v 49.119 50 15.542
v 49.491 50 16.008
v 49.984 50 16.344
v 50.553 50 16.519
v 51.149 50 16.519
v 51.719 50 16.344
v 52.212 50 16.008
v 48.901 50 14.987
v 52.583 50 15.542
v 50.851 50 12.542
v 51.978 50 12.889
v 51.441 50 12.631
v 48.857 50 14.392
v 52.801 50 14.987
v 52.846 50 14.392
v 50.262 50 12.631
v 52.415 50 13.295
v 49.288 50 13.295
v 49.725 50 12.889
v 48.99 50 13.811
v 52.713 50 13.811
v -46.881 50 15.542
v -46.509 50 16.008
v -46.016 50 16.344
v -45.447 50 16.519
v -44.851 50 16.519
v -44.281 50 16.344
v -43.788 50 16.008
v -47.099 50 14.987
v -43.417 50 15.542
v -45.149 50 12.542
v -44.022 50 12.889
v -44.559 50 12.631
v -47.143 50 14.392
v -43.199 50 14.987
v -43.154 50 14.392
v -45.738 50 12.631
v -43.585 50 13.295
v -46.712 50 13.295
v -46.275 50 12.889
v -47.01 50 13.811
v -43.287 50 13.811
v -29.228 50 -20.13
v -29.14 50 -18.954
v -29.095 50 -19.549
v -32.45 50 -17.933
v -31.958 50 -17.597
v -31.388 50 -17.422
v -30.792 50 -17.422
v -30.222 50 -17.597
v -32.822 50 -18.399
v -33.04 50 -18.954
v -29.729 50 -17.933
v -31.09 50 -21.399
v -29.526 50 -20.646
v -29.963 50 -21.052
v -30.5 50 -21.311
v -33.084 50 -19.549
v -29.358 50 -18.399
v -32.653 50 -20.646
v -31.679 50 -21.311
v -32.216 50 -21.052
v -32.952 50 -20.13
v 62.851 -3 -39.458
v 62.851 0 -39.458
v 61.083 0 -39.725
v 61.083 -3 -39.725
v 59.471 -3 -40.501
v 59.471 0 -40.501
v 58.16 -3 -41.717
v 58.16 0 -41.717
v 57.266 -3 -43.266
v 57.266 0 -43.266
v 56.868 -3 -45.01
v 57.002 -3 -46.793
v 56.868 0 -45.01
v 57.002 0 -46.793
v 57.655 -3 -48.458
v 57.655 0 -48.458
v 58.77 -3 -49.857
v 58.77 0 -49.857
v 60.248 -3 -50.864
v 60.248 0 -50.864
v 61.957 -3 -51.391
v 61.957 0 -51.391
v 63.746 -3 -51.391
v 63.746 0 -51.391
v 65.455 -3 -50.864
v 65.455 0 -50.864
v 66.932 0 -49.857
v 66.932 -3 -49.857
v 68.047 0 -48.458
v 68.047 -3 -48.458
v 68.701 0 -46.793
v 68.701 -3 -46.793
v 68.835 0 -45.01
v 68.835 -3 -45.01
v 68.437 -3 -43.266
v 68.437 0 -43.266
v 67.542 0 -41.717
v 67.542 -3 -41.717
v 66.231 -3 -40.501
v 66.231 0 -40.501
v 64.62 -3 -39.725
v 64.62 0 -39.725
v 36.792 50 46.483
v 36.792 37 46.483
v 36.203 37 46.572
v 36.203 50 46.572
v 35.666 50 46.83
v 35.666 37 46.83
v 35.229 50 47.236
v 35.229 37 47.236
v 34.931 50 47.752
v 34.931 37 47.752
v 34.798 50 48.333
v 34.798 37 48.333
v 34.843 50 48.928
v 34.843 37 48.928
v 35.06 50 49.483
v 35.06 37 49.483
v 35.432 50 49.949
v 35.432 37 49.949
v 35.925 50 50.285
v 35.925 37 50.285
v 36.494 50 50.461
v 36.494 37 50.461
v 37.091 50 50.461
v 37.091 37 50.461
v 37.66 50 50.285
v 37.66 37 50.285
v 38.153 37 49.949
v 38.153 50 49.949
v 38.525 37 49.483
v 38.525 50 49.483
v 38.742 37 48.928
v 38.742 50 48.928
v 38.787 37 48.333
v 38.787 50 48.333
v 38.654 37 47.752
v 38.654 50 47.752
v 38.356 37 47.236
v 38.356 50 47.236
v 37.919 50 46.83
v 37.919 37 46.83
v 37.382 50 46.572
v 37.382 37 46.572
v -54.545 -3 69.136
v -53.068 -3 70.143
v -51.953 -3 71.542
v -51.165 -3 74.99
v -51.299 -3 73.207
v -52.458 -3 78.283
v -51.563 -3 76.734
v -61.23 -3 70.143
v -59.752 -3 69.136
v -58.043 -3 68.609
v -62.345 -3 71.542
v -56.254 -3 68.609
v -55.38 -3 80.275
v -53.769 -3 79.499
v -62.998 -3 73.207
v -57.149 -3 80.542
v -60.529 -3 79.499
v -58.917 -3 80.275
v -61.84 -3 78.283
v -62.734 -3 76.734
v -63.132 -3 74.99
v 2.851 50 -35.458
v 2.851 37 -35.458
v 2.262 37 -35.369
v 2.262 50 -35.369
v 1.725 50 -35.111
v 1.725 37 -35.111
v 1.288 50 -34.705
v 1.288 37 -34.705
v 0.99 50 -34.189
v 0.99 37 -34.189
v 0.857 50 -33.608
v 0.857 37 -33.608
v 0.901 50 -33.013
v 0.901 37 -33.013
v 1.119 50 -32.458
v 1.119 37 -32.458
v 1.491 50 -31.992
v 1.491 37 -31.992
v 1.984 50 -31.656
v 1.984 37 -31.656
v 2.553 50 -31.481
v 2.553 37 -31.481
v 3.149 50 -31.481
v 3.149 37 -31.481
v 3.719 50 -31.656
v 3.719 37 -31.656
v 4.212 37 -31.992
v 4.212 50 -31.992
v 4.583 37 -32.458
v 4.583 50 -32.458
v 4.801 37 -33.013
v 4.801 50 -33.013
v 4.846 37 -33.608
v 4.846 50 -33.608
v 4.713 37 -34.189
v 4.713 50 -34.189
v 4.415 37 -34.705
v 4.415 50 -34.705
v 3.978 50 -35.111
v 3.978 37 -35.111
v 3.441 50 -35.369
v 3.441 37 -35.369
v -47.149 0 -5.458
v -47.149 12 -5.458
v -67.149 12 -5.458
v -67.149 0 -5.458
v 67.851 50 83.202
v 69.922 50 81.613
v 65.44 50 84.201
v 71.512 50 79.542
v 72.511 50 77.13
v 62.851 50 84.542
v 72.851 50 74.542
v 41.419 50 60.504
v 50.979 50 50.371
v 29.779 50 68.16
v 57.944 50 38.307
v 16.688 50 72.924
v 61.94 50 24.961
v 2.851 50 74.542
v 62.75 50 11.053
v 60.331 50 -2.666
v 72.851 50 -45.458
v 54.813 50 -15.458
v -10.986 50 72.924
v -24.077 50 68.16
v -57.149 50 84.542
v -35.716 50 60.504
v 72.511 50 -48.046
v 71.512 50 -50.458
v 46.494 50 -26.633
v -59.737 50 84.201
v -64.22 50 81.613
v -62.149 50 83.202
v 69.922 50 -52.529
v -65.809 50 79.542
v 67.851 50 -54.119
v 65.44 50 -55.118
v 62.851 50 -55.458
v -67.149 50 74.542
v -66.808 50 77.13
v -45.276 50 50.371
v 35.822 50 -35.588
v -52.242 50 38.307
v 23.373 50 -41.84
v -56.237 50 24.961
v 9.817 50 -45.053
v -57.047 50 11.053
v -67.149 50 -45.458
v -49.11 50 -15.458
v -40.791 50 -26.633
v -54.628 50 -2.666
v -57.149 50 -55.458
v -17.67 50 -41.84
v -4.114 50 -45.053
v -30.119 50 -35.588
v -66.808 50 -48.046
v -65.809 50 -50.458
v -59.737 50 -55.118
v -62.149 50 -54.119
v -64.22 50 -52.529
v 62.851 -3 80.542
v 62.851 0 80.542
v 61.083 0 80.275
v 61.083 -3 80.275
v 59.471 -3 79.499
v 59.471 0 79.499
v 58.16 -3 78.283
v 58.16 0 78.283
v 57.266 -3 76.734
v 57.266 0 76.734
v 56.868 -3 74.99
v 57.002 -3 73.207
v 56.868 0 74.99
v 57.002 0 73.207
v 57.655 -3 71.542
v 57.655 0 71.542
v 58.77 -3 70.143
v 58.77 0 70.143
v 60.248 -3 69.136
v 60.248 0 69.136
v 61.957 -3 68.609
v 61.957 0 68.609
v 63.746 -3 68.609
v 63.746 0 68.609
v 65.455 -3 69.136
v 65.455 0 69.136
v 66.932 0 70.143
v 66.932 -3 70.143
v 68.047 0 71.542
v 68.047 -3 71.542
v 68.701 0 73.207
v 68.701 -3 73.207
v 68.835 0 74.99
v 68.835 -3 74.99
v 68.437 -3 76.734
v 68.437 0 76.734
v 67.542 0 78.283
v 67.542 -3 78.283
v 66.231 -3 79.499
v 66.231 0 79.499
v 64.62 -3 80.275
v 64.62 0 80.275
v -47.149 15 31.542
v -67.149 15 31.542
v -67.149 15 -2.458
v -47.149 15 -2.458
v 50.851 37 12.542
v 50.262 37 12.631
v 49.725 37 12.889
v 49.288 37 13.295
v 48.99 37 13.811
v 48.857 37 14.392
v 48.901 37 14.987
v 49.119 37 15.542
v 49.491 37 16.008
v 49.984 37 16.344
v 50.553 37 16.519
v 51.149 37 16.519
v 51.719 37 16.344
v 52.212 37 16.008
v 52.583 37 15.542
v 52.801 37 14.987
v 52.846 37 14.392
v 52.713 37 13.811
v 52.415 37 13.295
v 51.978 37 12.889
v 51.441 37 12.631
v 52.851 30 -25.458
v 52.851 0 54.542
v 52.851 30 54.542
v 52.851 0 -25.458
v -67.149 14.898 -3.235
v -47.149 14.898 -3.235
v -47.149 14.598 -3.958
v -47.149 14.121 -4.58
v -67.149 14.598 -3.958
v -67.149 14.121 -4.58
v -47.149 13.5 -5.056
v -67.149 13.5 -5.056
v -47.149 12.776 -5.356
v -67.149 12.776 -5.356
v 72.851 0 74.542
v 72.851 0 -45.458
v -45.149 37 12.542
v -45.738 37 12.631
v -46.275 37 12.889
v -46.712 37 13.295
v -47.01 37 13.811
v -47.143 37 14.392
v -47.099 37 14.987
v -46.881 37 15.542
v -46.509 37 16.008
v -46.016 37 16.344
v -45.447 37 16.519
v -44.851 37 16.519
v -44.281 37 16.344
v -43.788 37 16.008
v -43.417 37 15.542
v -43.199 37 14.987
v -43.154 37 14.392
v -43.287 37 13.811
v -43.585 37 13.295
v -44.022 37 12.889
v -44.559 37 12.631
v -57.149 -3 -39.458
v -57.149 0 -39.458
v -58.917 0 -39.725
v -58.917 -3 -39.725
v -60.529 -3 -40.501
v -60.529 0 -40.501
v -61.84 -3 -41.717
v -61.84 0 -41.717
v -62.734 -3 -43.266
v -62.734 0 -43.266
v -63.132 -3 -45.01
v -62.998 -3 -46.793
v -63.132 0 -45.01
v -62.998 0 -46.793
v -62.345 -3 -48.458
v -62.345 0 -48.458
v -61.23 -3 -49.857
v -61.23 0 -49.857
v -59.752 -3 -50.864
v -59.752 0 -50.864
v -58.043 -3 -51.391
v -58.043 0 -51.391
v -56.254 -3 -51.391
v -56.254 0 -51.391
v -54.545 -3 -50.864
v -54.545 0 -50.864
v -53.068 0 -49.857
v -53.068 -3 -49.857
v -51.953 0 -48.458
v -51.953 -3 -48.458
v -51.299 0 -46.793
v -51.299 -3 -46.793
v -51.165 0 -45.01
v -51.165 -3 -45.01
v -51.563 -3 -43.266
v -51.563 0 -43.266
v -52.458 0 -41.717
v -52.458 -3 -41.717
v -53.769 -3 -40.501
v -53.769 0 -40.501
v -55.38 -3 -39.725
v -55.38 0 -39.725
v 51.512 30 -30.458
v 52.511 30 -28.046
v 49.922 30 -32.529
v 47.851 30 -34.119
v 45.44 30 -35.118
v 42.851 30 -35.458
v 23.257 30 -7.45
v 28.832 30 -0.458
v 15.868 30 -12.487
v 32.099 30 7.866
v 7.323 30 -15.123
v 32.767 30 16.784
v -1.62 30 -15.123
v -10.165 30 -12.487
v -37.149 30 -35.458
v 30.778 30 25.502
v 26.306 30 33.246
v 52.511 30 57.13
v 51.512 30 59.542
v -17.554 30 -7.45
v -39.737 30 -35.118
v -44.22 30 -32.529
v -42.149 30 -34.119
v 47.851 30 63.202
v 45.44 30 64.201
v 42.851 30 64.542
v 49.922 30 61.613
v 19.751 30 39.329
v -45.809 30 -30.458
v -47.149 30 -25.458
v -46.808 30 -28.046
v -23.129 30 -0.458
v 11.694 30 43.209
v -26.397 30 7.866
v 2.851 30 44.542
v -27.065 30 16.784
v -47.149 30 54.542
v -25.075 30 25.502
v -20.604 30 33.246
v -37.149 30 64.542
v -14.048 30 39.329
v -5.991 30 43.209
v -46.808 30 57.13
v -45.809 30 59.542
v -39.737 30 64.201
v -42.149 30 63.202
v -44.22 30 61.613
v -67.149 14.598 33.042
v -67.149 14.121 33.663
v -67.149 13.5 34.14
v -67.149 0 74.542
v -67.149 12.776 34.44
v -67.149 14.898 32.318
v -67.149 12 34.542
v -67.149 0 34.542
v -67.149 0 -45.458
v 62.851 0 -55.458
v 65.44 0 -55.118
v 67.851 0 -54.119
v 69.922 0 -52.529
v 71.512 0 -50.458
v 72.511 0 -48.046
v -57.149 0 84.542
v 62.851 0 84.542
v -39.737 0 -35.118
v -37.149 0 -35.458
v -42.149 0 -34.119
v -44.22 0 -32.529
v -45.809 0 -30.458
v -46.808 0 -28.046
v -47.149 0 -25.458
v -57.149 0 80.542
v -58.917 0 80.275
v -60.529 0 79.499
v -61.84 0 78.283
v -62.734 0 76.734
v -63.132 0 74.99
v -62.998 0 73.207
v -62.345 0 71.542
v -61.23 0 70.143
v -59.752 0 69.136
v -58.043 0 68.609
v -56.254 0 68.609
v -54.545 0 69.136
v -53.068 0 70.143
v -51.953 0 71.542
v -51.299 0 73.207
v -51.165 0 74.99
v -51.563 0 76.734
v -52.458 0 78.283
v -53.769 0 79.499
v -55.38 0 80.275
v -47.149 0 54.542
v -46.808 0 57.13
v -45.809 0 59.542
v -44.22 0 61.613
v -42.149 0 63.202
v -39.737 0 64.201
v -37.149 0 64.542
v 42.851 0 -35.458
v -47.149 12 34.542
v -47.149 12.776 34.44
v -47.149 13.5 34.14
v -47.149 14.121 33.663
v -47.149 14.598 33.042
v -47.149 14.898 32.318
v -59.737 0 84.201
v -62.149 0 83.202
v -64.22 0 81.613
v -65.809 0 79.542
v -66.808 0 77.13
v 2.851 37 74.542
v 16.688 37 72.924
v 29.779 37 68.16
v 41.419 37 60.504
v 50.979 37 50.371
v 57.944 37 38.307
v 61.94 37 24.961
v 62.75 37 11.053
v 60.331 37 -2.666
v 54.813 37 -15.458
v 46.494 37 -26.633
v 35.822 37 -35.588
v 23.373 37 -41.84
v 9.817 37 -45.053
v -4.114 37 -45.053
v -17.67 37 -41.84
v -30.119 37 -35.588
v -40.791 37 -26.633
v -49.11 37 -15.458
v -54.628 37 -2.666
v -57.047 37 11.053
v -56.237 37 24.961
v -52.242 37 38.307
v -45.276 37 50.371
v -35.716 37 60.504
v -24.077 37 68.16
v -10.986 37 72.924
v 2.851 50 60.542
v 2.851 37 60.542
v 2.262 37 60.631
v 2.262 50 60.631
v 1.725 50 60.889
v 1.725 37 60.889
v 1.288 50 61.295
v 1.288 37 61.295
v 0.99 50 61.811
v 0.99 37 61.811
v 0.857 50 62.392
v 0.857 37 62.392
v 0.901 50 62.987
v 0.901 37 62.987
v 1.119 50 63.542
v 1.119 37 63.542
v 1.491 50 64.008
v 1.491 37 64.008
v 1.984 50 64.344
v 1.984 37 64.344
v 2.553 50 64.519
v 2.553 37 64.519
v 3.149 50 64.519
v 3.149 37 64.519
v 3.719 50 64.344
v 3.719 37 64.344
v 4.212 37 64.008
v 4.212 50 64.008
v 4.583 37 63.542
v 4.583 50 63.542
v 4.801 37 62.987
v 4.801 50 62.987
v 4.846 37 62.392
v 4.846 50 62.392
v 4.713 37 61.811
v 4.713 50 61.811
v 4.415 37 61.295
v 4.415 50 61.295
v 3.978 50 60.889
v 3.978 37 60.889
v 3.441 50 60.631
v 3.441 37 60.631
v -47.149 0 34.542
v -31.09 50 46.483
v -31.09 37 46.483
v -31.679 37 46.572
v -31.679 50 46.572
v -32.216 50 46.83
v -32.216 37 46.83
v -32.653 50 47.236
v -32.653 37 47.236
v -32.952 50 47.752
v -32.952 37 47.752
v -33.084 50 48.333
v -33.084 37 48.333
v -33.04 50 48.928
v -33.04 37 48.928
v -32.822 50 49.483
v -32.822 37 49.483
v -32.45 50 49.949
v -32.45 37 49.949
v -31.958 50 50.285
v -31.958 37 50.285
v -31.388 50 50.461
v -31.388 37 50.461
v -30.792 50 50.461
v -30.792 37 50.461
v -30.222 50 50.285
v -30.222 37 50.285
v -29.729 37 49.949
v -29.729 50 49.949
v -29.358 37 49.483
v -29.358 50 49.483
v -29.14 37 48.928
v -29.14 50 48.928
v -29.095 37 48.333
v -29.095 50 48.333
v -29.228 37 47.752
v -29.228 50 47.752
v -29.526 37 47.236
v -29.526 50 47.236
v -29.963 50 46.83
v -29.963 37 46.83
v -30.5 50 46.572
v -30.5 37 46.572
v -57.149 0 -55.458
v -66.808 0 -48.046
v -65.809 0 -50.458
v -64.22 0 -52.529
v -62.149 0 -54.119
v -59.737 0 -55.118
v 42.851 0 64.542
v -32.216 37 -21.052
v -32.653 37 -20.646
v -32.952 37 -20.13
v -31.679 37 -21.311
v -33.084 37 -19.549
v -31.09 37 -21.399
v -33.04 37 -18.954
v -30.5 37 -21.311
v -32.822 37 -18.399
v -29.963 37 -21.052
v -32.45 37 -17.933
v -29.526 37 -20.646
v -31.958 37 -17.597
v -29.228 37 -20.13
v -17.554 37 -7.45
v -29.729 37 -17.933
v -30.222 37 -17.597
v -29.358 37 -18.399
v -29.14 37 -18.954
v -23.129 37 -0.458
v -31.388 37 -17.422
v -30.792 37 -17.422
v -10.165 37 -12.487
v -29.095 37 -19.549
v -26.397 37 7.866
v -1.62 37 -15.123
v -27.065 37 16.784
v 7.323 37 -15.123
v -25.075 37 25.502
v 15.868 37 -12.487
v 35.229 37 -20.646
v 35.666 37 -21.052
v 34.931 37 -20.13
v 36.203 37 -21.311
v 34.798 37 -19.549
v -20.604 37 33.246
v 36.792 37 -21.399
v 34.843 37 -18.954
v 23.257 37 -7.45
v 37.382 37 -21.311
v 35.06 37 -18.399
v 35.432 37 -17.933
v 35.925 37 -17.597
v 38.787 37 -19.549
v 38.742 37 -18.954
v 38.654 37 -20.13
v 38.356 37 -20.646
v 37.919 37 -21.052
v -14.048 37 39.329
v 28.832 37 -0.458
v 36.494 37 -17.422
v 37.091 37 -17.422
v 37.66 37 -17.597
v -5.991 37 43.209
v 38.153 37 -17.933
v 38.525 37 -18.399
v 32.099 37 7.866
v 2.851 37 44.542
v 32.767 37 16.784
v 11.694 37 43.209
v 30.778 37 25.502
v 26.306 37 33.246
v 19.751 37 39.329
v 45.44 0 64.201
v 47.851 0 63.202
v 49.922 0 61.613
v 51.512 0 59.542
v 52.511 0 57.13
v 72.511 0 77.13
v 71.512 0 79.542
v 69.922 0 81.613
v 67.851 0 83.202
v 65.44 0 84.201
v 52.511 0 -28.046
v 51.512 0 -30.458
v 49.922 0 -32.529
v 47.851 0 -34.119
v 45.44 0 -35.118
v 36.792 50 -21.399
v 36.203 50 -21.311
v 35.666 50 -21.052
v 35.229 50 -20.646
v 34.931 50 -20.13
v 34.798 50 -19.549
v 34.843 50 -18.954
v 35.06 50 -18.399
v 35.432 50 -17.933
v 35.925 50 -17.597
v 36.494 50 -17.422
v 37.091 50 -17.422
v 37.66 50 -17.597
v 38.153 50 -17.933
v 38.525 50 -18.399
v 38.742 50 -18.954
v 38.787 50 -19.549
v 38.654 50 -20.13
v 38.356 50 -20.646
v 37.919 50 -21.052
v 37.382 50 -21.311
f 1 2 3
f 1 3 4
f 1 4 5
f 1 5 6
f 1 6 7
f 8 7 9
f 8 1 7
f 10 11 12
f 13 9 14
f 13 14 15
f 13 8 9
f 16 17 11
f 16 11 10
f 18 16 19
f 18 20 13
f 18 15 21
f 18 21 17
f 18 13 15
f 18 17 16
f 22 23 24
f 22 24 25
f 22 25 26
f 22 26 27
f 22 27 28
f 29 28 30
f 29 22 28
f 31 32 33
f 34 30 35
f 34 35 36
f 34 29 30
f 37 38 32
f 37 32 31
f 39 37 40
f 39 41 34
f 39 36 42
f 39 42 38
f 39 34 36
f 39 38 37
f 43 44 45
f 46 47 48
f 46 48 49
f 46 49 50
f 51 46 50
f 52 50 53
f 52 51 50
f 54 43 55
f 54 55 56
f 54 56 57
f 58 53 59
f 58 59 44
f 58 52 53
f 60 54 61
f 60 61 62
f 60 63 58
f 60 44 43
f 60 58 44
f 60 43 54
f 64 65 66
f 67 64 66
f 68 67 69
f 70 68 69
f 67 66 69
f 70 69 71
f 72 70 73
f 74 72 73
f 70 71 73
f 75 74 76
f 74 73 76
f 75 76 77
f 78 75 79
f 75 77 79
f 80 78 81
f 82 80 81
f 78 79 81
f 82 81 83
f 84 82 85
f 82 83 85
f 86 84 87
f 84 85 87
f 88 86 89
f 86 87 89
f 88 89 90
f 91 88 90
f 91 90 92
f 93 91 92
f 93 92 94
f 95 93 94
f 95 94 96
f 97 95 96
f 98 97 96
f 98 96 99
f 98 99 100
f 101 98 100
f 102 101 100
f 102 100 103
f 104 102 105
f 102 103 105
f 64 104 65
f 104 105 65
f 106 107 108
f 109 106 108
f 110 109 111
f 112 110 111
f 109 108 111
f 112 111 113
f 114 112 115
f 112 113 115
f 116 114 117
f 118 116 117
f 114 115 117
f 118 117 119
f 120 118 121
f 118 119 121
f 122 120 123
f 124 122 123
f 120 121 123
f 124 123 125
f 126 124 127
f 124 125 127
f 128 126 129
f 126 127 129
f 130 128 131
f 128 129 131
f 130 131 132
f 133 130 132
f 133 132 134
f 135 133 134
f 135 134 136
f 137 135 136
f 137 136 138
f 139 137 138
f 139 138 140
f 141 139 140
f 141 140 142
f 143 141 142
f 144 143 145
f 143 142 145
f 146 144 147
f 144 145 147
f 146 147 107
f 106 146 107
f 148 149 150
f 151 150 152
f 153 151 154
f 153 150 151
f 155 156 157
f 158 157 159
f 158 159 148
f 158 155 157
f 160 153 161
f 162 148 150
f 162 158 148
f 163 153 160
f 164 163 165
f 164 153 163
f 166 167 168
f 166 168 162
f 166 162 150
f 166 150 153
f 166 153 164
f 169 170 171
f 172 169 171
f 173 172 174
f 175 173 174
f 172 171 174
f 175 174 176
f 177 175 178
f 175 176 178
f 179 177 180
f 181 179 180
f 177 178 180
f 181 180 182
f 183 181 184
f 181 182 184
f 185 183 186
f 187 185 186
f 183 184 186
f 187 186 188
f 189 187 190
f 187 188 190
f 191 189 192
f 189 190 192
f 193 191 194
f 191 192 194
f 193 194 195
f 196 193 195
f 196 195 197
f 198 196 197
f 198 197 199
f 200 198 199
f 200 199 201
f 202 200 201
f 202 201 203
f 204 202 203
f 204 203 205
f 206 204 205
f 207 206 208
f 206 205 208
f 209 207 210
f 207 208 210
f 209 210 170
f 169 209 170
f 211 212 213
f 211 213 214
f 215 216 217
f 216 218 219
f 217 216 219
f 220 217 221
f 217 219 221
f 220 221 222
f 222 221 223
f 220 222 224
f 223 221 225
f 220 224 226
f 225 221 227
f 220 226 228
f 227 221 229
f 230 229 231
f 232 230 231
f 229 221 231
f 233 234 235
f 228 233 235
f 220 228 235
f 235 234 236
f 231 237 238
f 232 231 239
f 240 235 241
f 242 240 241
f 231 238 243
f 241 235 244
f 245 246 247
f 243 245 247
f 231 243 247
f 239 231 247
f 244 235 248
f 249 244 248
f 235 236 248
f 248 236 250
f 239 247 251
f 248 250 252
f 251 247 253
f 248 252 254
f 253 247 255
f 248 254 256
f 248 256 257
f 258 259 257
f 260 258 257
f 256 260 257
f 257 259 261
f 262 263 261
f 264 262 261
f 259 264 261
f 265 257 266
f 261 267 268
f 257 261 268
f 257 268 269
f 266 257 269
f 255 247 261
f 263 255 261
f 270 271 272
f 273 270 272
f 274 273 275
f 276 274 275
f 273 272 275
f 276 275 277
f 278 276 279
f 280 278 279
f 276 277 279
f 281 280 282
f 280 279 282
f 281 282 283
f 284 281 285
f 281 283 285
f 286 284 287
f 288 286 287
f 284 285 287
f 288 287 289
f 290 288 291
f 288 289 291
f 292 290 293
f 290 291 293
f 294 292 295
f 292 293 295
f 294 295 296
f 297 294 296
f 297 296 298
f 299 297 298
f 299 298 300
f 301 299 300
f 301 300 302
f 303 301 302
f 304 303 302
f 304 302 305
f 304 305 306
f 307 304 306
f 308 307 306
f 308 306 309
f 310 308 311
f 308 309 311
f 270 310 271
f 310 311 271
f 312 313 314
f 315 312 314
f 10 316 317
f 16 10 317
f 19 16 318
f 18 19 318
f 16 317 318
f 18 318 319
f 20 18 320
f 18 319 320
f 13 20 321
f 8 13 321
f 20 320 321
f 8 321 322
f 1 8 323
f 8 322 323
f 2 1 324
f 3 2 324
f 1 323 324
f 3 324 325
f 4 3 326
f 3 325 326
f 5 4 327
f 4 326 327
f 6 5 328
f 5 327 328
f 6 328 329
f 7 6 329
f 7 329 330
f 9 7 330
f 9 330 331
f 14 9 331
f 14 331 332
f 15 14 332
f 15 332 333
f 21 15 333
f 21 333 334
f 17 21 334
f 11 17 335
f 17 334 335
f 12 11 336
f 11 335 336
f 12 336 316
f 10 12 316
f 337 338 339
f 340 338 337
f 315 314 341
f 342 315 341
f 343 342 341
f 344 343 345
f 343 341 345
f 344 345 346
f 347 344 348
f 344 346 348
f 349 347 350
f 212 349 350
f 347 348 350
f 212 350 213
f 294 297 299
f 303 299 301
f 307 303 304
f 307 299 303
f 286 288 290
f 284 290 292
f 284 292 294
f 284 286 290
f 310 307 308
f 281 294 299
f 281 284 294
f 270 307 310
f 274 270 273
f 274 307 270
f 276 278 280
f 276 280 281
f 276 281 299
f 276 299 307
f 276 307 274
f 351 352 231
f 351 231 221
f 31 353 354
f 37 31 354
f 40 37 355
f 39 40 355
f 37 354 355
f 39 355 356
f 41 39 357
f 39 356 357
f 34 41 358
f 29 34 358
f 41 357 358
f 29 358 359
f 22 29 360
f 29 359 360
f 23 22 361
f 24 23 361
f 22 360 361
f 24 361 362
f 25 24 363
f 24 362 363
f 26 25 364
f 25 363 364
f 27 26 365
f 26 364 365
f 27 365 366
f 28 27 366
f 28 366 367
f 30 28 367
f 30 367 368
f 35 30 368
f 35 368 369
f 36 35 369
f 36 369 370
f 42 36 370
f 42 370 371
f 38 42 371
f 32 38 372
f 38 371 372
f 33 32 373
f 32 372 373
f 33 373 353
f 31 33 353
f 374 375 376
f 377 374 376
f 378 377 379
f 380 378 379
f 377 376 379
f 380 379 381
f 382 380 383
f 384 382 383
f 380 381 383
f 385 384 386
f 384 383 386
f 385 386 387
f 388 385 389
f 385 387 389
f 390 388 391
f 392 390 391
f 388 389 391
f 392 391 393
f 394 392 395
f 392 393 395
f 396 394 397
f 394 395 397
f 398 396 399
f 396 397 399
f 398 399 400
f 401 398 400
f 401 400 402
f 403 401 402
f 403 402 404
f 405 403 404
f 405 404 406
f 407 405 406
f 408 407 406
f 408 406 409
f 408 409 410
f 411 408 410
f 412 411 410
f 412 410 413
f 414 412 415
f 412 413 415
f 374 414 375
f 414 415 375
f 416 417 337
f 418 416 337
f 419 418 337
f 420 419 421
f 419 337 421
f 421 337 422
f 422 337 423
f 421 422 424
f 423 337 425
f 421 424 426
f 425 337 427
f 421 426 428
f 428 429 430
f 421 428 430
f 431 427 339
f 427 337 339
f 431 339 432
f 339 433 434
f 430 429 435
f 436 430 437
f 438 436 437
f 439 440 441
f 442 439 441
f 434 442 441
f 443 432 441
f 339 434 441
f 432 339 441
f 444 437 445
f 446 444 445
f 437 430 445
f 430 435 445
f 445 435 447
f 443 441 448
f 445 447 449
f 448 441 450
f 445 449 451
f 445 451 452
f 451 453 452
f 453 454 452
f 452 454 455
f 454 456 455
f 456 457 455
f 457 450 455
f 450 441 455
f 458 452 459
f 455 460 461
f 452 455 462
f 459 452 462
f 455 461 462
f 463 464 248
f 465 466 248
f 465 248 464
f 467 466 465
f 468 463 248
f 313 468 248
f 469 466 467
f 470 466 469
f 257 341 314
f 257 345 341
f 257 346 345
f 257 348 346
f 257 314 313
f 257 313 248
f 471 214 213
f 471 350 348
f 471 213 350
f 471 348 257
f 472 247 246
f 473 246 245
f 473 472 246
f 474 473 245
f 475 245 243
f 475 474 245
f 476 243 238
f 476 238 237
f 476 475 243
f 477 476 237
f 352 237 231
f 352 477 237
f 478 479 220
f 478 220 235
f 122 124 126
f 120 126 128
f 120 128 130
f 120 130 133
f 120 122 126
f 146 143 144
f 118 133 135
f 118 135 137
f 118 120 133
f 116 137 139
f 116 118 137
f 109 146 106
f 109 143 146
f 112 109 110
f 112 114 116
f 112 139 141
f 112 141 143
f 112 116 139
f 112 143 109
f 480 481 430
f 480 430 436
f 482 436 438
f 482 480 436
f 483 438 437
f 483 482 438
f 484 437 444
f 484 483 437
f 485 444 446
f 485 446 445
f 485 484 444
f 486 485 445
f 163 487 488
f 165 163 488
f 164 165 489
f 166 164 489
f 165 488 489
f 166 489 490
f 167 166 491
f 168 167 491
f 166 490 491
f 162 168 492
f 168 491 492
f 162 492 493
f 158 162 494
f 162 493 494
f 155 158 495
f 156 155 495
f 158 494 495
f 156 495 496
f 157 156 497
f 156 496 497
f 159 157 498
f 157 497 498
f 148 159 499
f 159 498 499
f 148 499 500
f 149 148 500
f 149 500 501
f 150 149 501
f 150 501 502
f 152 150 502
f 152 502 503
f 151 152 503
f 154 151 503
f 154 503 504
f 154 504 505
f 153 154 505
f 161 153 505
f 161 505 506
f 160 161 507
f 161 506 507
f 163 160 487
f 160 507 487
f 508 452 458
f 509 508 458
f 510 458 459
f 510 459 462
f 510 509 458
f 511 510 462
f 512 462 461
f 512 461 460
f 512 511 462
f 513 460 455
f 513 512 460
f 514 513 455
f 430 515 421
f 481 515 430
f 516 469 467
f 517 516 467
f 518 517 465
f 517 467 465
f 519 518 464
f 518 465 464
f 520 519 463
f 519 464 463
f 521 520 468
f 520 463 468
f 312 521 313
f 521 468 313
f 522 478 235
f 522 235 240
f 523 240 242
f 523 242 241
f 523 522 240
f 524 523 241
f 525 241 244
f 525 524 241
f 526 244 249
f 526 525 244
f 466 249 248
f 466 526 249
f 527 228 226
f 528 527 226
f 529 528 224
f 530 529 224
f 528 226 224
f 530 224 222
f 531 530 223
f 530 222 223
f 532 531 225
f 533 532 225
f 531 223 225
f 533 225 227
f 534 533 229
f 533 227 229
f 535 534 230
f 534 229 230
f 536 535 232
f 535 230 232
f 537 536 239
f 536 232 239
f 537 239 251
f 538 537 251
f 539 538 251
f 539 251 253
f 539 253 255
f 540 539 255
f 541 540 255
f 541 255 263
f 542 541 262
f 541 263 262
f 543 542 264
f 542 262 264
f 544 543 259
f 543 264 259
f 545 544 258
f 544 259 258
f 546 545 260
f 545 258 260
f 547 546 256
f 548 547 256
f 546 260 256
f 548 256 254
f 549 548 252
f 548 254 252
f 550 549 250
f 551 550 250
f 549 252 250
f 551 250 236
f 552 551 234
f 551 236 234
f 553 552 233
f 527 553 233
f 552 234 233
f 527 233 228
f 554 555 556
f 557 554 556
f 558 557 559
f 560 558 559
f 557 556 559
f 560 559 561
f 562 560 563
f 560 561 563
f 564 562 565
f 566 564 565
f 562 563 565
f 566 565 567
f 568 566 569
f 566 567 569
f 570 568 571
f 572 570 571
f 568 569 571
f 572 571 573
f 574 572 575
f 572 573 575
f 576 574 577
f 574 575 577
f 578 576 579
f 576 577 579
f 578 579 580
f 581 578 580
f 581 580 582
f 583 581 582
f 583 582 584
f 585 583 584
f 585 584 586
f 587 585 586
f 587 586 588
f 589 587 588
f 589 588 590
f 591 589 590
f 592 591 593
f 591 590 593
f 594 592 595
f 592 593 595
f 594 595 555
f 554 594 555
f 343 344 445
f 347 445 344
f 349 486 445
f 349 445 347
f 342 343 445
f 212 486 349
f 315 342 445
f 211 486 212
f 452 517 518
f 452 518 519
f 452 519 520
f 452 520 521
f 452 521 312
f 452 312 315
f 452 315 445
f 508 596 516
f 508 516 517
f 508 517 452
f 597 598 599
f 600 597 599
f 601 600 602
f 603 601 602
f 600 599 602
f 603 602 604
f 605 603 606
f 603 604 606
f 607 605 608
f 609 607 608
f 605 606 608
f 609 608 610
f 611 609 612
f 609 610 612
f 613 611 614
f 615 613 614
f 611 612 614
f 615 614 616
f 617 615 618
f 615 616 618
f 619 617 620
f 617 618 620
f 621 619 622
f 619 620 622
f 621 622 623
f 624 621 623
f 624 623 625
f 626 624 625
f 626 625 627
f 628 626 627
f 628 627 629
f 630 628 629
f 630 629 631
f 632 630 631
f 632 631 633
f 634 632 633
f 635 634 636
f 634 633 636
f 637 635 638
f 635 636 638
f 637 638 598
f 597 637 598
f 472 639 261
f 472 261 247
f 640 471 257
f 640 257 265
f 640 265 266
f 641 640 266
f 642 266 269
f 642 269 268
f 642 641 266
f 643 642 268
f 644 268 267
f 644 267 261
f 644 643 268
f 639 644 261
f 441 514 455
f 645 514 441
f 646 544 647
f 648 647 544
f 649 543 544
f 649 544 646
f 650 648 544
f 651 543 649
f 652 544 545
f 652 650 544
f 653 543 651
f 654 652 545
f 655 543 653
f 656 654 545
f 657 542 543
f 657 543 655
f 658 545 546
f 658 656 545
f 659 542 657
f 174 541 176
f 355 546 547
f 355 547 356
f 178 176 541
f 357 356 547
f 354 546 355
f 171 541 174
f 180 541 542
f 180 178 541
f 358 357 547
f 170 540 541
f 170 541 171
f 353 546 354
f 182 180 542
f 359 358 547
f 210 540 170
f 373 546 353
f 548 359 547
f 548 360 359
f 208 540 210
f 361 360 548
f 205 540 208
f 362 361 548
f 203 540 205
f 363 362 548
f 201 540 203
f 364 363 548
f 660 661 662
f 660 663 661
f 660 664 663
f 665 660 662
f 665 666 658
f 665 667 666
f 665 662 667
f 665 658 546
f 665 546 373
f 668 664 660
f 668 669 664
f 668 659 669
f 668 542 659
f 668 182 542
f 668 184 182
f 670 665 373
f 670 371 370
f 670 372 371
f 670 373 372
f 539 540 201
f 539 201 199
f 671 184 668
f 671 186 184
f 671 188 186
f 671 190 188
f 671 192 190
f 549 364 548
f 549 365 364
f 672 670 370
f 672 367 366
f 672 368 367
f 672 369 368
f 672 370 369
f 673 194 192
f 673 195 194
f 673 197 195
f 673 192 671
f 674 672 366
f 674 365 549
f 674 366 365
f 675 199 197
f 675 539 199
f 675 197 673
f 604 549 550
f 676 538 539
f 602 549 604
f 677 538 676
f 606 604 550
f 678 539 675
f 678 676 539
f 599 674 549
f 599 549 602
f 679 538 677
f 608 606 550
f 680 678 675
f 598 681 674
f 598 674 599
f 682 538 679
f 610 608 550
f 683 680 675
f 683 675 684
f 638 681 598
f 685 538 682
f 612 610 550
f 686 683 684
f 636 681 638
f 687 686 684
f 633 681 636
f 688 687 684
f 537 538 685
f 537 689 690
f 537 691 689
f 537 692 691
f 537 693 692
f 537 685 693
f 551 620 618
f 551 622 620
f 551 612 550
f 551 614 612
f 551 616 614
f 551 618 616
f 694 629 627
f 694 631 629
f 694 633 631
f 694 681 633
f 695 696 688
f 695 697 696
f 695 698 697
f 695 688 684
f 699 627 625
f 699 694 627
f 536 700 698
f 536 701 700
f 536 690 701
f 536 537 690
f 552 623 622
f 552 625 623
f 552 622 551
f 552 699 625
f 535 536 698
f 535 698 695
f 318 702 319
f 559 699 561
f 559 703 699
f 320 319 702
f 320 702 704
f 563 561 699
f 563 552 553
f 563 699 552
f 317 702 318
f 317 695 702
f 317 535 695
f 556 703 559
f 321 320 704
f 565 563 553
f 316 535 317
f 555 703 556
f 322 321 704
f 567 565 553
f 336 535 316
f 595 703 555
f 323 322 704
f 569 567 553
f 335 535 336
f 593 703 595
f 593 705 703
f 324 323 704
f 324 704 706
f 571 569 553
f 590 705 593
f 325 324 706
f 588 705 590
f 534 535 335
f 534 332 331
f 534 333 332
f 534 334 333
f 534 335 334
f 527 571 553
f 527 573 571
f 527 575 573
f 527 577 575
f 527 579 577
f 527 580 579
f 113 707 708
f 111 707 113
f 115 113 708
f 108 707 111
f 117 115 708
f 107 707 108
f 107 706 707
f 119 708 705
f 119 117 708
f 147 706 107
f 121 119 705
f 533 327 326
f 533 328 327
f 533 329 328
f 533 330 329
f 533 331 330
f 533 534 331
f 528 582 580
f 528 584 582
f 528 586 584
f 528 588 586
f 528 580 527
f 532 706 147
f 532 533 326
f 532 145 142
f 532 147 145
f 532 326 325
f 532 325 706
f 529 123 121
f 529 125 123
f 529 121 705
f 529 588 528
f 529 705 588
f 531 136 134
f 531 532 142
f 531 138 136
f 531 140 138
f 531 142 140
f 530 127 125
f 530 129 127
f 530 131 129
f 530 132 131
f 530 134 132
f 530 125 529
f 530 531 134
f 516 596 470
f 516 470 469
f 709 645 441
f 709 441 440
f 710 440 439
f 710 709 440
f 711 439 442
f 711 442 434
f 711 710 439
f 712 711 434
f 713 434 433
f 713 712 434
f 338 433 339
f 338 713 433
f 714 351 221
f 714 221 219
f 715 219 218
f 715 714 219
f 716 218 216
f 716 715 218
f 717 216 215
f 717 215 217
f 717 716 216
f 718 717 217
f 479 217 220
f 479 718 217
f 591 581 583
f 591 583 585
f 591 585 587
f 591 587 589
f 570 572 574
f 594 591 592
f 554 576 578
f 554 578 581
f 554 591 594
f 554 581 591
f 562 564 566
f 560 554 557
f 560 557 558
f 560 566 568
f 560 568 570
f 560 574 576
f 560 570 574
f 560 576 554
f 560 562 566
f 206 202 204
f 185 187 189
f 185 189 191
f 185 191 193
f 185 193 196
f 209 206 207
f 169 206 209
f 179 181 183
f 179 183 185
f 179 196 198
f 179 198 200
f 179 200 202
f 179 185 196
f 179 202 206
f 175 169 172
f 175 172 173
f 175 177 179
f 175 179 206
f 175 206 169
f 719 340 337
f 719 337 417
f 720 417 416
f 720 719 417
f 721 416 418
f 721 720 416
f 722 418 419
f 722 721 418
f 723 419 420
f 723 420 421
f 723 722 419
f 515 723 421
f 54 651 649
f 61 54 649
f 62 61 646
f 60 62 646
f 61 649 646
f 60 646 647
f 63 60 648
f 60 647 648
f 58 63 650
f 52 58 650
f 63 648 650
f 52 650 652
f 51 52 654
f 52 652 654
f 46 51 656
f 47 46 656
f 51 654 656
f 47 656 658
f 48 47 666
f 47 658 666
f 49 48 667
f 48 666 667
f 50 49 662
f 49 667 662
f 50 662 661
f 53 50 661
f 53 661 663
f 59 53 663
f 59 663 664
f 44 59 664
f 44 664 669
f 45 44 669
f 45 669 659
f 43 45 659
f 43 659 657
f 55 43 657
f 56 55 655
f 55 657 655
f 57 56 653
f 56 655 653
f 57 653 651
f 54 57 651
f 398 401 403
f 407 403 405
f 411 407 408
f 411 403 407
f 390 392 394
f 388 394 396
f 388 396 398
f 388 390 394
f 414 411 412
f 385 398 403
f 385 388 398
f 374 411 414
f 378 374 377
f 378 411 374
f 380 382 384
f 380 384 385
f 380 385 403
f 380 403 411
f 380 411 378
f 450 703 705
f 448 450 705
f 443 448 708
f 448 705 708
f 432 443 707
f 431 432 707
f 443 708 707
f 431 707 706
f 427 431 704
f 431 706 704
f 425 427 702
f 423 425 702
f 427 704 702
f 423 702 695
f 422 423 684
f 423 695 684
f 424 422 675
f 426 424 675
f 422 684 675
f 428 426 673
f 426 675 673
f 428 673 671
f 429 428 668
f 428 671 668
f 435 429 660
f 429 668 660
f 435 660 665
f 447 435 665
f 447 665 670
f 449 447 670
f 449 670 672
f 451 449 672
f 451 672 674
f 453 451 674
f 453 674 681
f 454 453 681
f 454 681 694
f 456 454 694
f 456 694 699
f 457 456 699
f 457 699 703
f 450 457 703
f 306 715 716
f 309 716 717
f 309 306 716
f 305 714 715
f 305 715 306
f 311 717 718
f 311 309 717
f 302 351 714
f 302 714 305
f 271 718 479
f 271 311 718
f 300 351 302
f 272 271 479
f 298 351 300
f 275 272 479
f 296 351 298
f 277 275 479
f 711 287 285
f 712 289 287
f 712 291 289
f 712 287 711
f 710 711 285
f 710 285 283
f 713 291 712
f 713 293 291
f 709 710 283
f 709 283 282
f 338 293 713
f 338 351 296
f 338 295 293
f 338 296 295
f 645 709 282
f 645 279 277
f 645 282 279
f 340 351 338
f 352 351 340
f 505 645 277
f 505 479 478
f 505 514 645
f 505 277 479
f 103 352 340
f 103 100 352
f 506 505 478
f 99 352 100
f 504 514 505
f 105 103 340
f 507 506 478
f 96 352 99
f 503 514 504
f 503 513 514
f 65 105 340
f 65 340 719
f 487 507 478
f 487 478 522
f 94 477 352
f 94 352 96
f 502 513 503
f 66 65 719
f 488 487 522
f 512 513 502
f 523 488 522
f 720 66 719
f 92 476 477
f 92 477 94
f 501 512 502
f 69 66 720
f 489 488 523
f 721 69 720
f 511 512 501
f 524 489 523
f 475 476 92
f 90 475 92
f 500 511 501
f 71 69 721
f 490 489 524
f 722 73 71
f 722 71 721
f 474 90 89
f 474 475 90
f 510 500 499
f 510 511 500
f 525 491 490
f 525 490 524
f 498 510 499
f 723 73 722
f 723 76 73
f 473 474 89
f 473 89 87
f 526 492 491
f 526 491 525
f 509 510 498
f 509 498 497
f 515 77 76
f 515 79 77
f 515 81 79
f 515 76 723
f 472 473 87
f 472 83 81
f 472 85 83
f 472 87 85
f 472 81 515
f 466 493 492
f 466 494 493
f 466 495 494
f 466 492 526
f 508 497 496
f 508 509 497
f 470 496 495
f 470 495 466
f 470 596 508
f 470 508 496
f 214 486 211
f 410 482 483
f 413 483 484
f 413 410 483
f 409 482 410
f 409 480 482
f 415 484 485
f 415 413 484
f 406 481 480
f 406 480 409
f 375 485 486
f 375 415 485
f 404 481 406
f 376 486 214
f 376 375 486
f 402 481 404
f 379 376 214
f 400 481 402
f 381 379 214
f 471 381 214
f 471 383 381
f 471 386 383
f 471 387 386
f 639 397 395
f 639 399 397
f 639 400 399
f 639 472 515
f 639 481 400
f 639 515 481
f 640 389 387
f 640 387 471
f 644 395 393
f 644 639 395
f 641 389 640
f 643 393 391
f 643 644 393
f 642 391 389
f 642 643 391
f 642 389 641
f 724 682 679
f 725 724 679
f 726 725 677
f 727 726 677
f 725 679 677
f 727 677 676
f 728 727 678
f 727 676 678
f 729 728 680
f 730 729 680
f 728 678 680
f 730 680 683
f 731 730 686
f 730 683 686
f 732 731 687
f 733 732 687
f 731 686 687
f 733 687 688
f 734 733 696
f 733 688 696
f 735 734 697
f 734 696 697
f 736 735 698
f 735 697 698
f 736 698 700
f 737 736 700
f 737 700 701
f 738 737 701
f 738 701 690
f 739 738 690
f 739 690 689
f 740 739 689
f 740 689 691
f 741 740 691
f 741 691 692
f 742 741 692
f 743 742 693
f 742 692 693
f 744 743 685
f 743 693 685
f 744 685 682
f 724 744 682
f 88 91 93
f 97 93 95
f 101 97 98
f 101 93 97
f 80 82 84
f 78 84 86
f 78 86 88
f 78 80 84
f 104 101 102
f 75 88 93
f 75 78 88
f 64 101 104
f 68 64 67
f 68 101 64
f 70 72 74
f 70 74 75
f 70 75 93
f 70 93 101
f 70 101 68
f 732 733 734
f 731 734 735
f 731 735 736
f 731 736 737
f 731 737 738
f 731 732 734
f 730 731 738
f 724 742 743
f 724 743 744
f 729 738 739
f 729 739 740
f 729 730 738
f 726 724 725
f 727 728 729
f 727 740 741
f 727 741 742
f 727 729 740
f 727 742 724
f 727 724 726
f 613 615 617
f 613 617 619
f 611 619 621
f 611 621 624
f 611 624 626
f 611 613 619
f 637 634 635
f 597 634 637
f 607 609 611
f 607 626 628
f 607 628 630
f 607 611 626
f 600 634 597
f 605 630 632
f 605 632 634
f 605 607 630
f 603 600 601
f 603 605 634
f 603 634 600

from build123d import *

# Parameters (mm, degrees)
BOSS_EXTRUDE1_DEPTH = 50
SKETCH2_R           = 60
CUT_EXTRUDE1_DEPTH  = 13
SKETCH3_R           = 10
CUT_EXTRUDE2_DEPTH  = 50
SKETCH4_R           = 2
BOSS_EXTRUDE2_DEPTH = 13
CUT_EXTRUDE3_DEPTH  = 30
SKETCH6_R           = 6
BOSS_EXTRUDE4_DEPTH = 3
SKETCH7_R           = 30
CUT_EXTRUDE4_DEPTH  = 40
CUT_EXTRUDE5_DEPTH  = 25


with BuildPart() as part:
    # Sketch1 → Boss-Extrude1 (new body)
    with BuildSketch(Plane(origin=(0, 0, 0), x_dir=(1, 0, 0), z_dir=(0, 1, 0))):
        with BuildLine():
            Line((-57.148676171, 55.458248473), (62.851323829, 55.458248473))
            ThreePointArc((62.851323829, 55.458248473), (69.922391641, 52.529316284), (72.851323829, 45.458248473))
            Line((72.851323829, 45.458248473), (72.851323829, -74.541751527))
            ThreePointArc((72.851323829, -74.541751527), (69.922391641, -81.612819339), (62.851323829, -84.541751527))
            Line((62.851323829, -84.541751527), (-57.148676171, -84.541751527))
            ThreePointArc((-57.148676171, -84.541751527), (-64.219743983, -81.612819339), (-67.148676171, -74.541751527))
            Line((-67.148676171, -74.541751527), (-67.148676171, 45.458248473))
            ThreePointArc((-67.148676171, 45.458248473), (-64.219743983, 52.529316284), (-57.148676171, 55.458248473))
        make_face()
    extrude(amount=BOSS_EXTRUDE1_DEPTH)

    # Sketch2 → Cut-Extrude1 (cut)
    with BuildSketch(Plane(origin=(0, 50, 0), x_dir=(1, 0, 0), z_dir=(0, 1, 0))):
        with Locations(Location((2.851323829, -14.541751527, 0), (0, 0, 270))):
            Circle(SKETCH2_R)
    extrude(amount=-CUT_EXTRUDE1_DEPTH, mode=Mode.SUBTRACT)

    # Sketch3 → Cut-Extrude2 (cut)
    with BuildSketch(Plane(origin=(0, 37, 0), x_dir=(1, 0, 0), z_dir=(0, 1, 0))):
        with Locations(Location((2.851323829, -14.541751527, 0), (0, 0, 270))):
            Circle(SKETCH3_R)
    extrude(amount=-CUT_EXTRUDE2_DEPTH, mode=Mode.SUBTRACT)

    # Sketch4 → Boss-Extrude2 (add)
    with BuildSketch(Plane(origin=(0, 37, 0), x_dir=(1, 0, 0), z_dir=(0, 1, 0))):
        with Locations(Location((2.851323829, 33.458248473, 0), (0, 0, 90))):
            Circle(SKETCH4_R)
        with Locations(Location((36.792449326, 19.399373969, 0), (0, 0, 90))):
            Circle(SKETCH4_R)
        with Locations(Location((50.851323829, -14.541751527, 0), (0, 0, 90))):
            Circle(SKETCH4_R)
        with Locations(Location((36.792449326, -48.482877024, 0), (0, 0, 90))):
            Circle(SKETCH4_R)
        with Locations(Location((2.851323829, -62.541751527, 0), (0, 0, 90))):
            Circle(SKETCH4_R)
        with Locations(Location((-31.089801668, -48.482877024, 0), (0, 0, 90))):
            Circle(SKETCH4_R)
        with Locations(Location((-45.148676171, -14.541751527, 0), (0, 0, 90))):
            Circle(SKETCH4_R)
        with Locations(Location((-31.089801668, 19.399373969, 0), (0, 0, 90))):
            Circle(SKETCH4_R)
    extrude(amount=BOSS_EXTRUDE2_DEPTH)

    # Sketch5 → Cut-Extrude3 (cut)
    with BuildSketch(Plane.XZ):
        with BuildLine():
            Line((-37.148676171, 64.541751527), (42.851323829, 64.541751527))
            ThreePointArc((42.851323829, 64.541751527), (49.922391641, 61.612819339), (52.851323829, 54.541751527))
            Line((52.851323829, 54.541751527), (52.851323829, -25.458248473))
            ThreePointArc((52.851323829, -25.458248473), (49.922391641, -32.529316284), (42.851323829, -35.458248473))
            Line((42.851323829, -35.458248473), (-37.148676171, -35.458248473))
            ThreePointArc((-37.148676171, -35.458248473), (-44.219743983, -32.529316284), (-47.148676171, -25.458248473))
            Line((-47.148676171, -25.458248473), (-47.148676171, 54.541751527))
            ThreePointArc((-47.148676171, 54.541751527), (-44.219743983, 61.612819339), (-37.148676171, 64.541751527))
        make_face()
    extrude(amount=-CUT_EXTRUDE3_DEPTH, mode=Mode.SUBTRACT)

    # Sketch6 → Boss-Extrude4 (add)
    with BuildSketch(Plane.XZ):
        with Locations(Location((-57.148676171, 74.541751527, 0), (0, 0, 90))):
            Circle(SKETCH6_R)
        with Locations(Location((62.851323829, 74.541751527, 0), (0, 0, 90))):
            Circle(SKETCH6_R)
        with Locations(Location((62.851323829, -45.458248473, 0), (0, 0, 90))):
            Circle(SKETCH6_R)
        with Locations(Location((-57.148676171, -45.458248473, 0), (0, 0, 90))):
            Circle(SKETCH6_R)
    extrude(amount=BOSS_EXTRUDE4_DEPTH)

    # Sketch7 → Cut-Extrude4 (cut)
    with BuildSketch(Plane(origin=(0, 37, 0), x_dir=(1, 0, 0), z_dir=(0, 1, 0))):
        with Locations(Location((2.851323829, -14.541751527, 0), (0, 0, 270))):
            Circle(SKETCH7_R)
    extrude(amount=-CUT_EXTRUDE4_DEPTH, mode=Mode.SUBTRACT)

    # Sketch8 → Cut-Extrude5 (cut)
    with BuildSketch(Plane.ZY.offset(67.148676171)):
        with BuildLine():
            Line((-5.458248473, 0), (34.541751527, 0))
            Line((34.541751527, 0), (34.541751527, 12))
            ThreePointArc((34.541751527, 12), (33.663071871, 14.121320344), (31.541751527, 15))
            Line((31.541751527, 15), (-2.458248473, 15))
            ThreePointArc((-2.458248473, 15), (-4.579568816, 14.121320344), (-5.458248473, 12))
            Line((-5.458248473, 12), (-5.458248473, 0))
        make_face()
    extrude(amount=-CUT_EXTRUDE5_DEPTH, mode=Mode.SUBTRACT)


solid = part.part
